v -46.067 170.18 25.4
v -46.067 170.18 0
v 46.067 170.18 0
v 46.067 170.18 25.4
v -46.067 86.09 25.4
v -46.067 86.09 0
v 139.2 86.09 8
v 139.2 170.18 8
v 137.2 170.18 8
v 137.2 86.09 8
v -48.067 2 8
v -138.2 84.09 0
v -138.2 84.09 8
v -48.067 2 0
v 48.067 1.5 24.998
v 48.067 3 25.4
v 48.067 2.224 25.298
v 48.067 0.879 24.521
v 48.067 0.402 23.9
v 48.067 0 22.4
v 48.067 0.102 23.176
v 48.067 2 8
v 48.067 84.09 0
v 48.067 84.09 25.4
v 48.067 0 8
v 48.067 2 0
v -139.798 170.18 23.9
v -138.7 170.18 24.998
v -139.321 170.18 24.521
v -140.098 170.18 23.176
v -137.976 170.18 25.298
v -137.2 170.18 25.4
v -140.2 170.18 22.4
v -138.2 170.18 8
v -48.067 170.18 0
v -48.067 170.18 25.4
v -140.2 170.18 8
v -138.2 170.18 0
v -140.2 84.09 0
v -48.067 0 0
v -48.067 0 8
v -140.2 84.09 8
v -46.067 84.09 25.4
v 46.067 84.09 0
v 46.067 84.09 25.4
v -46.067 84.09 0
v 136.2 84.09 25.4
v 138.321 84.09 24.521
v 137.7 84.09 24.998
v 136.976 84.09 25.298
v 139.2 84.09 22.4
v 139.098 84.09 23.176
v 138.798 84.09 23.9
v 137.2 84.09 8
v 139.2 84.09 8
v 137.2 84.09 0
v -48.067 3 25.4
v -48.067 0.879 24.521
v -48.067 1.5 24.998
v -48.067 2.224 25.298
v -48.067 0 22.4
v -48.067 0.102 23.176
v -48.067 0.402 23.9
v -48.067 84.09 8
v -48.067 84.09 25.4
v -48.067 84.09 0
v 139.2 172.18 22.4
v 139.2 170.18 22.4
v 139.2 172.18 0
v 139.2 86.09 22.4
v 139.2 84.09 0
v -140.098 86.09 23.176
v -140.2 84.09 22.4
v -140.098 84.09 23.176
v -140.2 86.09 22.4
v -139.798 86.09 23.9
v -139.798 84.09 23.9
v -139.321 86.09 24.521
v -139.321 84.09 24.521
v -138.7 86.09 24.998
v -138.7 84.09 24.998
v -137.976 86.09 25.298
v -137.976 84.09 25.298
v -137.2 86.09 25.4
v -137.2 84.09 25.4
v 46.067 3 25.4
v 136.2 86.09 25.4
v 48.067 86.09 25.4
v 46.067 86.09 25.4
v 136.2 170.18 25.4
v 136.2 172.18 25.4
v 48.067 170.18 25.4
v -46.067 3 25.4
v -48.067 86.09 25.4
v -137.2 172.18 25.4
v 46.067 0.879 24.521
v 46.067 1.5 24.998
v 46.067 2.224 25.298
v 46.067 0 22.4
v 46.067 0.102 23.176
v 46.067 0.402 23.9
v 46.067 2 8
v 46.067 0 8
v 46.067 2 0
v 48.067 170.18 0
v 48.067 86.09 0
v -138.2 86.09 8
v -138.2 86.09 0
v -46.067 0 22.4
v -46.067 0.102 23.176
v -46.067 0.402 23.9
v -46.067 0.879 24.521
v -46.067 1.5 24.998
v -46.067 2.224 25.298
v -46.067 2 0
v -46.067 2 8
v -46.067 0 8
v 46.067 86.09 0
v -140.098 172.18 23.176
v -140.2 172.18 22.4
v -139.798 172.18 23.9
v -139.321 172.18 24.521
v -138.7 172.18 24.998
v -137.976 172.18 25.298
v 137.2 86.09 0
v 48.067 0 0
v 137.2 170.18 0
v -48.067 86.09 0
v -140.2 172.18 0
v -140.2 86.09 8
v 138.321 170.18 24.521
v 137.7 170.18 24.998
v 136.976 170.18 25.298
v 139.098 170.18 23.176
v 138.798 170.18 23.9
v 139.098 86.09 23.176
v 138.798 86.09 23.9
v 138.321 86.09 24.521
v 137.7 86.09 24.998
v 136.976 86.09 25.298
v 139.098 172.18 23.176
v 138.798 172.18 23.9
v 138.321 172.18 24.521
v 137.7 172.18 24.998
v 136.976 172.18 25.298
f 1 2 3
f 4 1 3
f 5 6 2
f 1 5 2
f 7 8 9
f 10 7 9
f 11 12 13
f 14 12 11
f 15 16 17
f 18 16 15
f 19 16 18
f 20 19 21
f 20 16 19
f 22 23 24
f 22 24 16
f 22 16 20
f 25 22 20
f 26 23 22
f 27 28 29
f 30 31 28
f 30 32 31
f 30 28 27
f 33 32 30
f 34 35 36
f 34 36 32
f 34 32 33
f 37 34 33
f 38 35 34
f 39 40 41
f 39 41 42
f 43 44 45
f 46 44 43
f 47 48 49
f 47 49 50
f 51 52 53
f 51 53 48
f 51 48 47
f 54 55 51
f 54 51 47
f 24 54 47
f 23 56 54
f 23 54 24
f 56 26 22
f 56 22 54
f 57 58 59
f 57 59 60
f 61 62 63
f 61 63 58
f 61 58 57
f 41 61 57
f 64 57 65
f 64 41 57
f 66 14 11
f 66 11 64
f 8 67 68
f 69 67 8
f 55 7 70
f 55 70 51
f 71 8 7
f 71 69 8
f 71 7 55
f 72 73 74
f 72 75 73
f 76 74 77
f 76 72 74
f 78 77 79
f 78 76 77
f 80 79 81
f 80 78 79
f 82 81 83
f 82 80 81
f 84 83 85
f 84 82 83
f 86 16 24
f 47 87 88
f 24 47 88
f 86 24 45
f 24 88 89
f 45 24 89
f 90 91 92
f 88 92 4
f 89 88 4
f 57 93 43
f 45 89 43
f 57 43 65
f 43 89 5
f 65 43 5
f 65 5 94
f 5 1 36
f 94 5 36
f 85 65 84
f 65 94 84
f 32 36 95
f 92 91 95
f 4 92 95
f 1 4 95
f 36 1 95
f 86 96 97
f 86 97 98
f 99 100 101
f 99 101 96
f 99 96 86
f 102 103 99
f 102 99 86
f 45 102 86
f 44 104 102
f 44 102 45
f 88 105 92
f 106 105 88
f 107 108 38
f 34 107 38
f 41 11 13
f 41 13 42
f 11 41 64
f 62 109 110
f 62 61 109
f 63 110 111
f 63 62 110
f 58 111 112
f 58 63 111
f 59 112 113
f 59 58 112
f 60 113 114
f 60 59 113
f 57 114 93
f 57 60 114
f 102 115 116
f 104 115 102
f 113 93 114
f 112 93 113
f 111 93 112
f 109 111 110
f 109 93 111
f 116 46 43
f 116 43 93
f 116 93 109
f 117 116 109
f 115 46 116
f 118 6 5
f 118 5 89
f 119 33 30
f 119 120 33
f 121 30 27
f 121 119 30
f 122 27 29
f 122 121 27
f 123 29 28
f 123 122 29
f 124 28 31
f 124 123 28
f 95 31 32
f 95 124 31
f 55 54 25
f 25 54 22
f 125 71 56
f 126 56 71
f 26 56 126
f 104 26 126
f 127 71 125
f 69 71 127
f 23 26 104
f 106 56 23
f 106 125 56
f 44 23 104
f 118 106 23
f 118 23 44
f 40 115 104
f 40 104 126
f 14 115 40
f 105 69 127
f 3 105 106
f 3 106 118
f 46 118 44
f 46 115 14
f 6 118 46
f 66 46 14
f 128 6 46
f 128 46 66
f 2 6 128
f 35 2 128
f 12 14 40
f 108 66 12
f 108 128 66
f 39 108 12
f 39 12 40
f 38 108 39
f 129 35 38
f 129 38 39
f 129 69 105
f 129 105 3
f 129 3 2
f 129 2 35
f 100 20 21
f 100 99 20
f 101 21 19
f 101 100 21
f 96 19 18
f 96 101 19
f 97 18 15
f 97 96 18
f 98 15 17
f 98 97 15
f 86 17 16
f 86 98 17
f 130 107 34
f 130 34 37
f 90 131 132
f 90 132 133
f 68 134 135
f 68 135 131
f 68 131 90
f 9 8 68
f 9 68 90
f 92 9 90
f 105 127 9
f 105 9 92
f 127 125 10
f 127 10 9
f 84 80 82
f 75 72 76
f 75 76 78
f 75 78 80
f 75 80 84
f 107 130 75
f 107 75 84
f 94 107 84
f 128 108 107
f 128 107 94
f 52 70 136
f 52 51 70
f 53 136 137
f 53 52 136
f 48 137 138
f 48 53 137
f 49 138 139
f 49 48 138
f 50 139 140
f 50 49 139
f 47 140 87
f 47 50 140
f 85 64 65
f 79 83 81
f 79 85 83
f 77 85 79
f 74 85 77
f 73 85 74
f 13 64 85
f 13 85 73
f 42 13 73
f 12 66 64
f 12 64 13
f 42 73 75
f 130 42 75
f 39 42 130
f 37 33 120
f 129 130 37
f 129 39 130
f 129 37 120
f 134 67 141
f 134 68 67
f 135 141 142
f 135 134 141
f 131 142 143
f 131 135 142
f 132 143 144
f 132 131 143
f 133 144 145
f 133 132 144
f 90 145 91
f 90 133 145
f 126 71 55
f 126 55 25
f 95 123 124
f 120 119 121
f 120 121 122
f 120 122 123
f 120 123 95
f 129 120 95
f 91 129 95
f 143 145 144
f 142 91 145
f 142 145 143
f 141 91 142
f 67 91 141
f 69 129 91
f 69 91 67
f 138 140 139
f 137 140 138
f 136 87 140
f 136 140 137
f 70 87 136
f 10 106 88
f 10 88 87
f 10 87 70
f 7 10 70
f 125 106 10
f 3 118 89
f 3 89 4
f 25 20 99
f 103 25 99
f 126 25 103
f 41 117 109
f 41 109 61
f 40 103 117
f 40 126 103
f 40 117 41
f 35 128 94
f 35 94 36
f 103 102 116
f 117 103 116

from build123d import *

# Parameters (mm, degrees)
SKETCH_W      = 92.1334
SKETCH_H      = 84.09
PAD_DEPTH     = 25.4
FILLET_R      = 3
SKETCH001_W   = 90.133333
SKETCH001_H   = 84.09
SKETCH001_W_2 = 92.133365
SKETCH001_H_2 = 82.09
SKETCH001_W_3 = 89.13332
SKETCH001_W_4 = 92.1334
PAD001_DEPTH  = 8


with BuildPart() as part:
    # Sketch → Pad (new body)
    with BuildSketch(Plane.XY):
        Polygon((-140.19998, 86.09), (-48.066647, 86.09), (-48.066647, 170.18), (-140.19998, 170.18), (-140.19998, 172.18), (139.20002, 172.18), (139.20002, 170.18), (48.0667, 170.18), (48.0667, 86.09), (139.20002, 86.09), (139.20002, 84.09), (48.066665, 84.09), (48.066665, 0), (46.066665, 0), (46.066665, 84.09), (-46.06665, 84.09), (-46.06665, 0), (-48.06665, 0), (-48.06665, 84.09), (-140.19998, 84.09), align=None)
        with Locations((0, 128.135)):
            Rectangle(SKETCH_W, SKETCH_H, mode=Mode.SUBTRACT)
    extrude(amount=PAD_DEPTH)

    # Fillet
    fillet_edges = [part.edges().sort_by_distance(p)[0] for p in [
        (-47.06665, 0, 25.4),
        (47.066665, 0, 25.4),
        (139.20002, 171.18, 25.4),
        (139.20002, 85.09, 25.4),
        (-140.19998, 85.09, 25.4),
        (-140.19998, 171.18, 25.4),
    ]]
    fillet(fillet_edges, radius=FILLET_R)

    # Sketch001 → Pad001 (join)
    with BuildSketch(Plane.XY):
        Polygon((139.20002, 86.09), (139.20002, 84.09), (48.066665, 0), (46.066665, 0), (-46.06665, 0), (-48.06665, 0), (-140.19998, 84.09), (-140.19998, 86.09), (-140.19998, 170.18), (-140.19998, 172.18), (139.20002, 172.18), (139.20002, 170.18), align=None)
        with Locations((-93.133313, 128.135)):
            Rectangle(SKETCH001_W, SKETCH001_H, mode=Mode.SUBTRACT)
        Polygon((137.20002, 84.09), (48.066665, 84.09), (48.066665, 2), align=None, mode=Mode.SUBTRACT)
        with Locations((-1.7e-05, 43.045)):
            Rectangle(SKETCH001_W_2, SKETCH001_H_2, mode=Mode.SUBTRACT)
        Polygon((-48.0667, 2), (-48.0667, 84.09), (-138.19998, 84.09), align=None, mode=Mode.SUBTRACT)
        with Locations((92.63336, 128.135)):
            Rectangle(SKETCH001_W_3, SKETCH001_H, mode=Mode.SUBTRACT)
        with Locations((0, 128.135)):
            Rectangle(SKETCH001_W_4, SKETCH001_H, mode=Mode.SUBTRACT)
    extrude(amount=PAD001_DEPTH)


solid = part.part
